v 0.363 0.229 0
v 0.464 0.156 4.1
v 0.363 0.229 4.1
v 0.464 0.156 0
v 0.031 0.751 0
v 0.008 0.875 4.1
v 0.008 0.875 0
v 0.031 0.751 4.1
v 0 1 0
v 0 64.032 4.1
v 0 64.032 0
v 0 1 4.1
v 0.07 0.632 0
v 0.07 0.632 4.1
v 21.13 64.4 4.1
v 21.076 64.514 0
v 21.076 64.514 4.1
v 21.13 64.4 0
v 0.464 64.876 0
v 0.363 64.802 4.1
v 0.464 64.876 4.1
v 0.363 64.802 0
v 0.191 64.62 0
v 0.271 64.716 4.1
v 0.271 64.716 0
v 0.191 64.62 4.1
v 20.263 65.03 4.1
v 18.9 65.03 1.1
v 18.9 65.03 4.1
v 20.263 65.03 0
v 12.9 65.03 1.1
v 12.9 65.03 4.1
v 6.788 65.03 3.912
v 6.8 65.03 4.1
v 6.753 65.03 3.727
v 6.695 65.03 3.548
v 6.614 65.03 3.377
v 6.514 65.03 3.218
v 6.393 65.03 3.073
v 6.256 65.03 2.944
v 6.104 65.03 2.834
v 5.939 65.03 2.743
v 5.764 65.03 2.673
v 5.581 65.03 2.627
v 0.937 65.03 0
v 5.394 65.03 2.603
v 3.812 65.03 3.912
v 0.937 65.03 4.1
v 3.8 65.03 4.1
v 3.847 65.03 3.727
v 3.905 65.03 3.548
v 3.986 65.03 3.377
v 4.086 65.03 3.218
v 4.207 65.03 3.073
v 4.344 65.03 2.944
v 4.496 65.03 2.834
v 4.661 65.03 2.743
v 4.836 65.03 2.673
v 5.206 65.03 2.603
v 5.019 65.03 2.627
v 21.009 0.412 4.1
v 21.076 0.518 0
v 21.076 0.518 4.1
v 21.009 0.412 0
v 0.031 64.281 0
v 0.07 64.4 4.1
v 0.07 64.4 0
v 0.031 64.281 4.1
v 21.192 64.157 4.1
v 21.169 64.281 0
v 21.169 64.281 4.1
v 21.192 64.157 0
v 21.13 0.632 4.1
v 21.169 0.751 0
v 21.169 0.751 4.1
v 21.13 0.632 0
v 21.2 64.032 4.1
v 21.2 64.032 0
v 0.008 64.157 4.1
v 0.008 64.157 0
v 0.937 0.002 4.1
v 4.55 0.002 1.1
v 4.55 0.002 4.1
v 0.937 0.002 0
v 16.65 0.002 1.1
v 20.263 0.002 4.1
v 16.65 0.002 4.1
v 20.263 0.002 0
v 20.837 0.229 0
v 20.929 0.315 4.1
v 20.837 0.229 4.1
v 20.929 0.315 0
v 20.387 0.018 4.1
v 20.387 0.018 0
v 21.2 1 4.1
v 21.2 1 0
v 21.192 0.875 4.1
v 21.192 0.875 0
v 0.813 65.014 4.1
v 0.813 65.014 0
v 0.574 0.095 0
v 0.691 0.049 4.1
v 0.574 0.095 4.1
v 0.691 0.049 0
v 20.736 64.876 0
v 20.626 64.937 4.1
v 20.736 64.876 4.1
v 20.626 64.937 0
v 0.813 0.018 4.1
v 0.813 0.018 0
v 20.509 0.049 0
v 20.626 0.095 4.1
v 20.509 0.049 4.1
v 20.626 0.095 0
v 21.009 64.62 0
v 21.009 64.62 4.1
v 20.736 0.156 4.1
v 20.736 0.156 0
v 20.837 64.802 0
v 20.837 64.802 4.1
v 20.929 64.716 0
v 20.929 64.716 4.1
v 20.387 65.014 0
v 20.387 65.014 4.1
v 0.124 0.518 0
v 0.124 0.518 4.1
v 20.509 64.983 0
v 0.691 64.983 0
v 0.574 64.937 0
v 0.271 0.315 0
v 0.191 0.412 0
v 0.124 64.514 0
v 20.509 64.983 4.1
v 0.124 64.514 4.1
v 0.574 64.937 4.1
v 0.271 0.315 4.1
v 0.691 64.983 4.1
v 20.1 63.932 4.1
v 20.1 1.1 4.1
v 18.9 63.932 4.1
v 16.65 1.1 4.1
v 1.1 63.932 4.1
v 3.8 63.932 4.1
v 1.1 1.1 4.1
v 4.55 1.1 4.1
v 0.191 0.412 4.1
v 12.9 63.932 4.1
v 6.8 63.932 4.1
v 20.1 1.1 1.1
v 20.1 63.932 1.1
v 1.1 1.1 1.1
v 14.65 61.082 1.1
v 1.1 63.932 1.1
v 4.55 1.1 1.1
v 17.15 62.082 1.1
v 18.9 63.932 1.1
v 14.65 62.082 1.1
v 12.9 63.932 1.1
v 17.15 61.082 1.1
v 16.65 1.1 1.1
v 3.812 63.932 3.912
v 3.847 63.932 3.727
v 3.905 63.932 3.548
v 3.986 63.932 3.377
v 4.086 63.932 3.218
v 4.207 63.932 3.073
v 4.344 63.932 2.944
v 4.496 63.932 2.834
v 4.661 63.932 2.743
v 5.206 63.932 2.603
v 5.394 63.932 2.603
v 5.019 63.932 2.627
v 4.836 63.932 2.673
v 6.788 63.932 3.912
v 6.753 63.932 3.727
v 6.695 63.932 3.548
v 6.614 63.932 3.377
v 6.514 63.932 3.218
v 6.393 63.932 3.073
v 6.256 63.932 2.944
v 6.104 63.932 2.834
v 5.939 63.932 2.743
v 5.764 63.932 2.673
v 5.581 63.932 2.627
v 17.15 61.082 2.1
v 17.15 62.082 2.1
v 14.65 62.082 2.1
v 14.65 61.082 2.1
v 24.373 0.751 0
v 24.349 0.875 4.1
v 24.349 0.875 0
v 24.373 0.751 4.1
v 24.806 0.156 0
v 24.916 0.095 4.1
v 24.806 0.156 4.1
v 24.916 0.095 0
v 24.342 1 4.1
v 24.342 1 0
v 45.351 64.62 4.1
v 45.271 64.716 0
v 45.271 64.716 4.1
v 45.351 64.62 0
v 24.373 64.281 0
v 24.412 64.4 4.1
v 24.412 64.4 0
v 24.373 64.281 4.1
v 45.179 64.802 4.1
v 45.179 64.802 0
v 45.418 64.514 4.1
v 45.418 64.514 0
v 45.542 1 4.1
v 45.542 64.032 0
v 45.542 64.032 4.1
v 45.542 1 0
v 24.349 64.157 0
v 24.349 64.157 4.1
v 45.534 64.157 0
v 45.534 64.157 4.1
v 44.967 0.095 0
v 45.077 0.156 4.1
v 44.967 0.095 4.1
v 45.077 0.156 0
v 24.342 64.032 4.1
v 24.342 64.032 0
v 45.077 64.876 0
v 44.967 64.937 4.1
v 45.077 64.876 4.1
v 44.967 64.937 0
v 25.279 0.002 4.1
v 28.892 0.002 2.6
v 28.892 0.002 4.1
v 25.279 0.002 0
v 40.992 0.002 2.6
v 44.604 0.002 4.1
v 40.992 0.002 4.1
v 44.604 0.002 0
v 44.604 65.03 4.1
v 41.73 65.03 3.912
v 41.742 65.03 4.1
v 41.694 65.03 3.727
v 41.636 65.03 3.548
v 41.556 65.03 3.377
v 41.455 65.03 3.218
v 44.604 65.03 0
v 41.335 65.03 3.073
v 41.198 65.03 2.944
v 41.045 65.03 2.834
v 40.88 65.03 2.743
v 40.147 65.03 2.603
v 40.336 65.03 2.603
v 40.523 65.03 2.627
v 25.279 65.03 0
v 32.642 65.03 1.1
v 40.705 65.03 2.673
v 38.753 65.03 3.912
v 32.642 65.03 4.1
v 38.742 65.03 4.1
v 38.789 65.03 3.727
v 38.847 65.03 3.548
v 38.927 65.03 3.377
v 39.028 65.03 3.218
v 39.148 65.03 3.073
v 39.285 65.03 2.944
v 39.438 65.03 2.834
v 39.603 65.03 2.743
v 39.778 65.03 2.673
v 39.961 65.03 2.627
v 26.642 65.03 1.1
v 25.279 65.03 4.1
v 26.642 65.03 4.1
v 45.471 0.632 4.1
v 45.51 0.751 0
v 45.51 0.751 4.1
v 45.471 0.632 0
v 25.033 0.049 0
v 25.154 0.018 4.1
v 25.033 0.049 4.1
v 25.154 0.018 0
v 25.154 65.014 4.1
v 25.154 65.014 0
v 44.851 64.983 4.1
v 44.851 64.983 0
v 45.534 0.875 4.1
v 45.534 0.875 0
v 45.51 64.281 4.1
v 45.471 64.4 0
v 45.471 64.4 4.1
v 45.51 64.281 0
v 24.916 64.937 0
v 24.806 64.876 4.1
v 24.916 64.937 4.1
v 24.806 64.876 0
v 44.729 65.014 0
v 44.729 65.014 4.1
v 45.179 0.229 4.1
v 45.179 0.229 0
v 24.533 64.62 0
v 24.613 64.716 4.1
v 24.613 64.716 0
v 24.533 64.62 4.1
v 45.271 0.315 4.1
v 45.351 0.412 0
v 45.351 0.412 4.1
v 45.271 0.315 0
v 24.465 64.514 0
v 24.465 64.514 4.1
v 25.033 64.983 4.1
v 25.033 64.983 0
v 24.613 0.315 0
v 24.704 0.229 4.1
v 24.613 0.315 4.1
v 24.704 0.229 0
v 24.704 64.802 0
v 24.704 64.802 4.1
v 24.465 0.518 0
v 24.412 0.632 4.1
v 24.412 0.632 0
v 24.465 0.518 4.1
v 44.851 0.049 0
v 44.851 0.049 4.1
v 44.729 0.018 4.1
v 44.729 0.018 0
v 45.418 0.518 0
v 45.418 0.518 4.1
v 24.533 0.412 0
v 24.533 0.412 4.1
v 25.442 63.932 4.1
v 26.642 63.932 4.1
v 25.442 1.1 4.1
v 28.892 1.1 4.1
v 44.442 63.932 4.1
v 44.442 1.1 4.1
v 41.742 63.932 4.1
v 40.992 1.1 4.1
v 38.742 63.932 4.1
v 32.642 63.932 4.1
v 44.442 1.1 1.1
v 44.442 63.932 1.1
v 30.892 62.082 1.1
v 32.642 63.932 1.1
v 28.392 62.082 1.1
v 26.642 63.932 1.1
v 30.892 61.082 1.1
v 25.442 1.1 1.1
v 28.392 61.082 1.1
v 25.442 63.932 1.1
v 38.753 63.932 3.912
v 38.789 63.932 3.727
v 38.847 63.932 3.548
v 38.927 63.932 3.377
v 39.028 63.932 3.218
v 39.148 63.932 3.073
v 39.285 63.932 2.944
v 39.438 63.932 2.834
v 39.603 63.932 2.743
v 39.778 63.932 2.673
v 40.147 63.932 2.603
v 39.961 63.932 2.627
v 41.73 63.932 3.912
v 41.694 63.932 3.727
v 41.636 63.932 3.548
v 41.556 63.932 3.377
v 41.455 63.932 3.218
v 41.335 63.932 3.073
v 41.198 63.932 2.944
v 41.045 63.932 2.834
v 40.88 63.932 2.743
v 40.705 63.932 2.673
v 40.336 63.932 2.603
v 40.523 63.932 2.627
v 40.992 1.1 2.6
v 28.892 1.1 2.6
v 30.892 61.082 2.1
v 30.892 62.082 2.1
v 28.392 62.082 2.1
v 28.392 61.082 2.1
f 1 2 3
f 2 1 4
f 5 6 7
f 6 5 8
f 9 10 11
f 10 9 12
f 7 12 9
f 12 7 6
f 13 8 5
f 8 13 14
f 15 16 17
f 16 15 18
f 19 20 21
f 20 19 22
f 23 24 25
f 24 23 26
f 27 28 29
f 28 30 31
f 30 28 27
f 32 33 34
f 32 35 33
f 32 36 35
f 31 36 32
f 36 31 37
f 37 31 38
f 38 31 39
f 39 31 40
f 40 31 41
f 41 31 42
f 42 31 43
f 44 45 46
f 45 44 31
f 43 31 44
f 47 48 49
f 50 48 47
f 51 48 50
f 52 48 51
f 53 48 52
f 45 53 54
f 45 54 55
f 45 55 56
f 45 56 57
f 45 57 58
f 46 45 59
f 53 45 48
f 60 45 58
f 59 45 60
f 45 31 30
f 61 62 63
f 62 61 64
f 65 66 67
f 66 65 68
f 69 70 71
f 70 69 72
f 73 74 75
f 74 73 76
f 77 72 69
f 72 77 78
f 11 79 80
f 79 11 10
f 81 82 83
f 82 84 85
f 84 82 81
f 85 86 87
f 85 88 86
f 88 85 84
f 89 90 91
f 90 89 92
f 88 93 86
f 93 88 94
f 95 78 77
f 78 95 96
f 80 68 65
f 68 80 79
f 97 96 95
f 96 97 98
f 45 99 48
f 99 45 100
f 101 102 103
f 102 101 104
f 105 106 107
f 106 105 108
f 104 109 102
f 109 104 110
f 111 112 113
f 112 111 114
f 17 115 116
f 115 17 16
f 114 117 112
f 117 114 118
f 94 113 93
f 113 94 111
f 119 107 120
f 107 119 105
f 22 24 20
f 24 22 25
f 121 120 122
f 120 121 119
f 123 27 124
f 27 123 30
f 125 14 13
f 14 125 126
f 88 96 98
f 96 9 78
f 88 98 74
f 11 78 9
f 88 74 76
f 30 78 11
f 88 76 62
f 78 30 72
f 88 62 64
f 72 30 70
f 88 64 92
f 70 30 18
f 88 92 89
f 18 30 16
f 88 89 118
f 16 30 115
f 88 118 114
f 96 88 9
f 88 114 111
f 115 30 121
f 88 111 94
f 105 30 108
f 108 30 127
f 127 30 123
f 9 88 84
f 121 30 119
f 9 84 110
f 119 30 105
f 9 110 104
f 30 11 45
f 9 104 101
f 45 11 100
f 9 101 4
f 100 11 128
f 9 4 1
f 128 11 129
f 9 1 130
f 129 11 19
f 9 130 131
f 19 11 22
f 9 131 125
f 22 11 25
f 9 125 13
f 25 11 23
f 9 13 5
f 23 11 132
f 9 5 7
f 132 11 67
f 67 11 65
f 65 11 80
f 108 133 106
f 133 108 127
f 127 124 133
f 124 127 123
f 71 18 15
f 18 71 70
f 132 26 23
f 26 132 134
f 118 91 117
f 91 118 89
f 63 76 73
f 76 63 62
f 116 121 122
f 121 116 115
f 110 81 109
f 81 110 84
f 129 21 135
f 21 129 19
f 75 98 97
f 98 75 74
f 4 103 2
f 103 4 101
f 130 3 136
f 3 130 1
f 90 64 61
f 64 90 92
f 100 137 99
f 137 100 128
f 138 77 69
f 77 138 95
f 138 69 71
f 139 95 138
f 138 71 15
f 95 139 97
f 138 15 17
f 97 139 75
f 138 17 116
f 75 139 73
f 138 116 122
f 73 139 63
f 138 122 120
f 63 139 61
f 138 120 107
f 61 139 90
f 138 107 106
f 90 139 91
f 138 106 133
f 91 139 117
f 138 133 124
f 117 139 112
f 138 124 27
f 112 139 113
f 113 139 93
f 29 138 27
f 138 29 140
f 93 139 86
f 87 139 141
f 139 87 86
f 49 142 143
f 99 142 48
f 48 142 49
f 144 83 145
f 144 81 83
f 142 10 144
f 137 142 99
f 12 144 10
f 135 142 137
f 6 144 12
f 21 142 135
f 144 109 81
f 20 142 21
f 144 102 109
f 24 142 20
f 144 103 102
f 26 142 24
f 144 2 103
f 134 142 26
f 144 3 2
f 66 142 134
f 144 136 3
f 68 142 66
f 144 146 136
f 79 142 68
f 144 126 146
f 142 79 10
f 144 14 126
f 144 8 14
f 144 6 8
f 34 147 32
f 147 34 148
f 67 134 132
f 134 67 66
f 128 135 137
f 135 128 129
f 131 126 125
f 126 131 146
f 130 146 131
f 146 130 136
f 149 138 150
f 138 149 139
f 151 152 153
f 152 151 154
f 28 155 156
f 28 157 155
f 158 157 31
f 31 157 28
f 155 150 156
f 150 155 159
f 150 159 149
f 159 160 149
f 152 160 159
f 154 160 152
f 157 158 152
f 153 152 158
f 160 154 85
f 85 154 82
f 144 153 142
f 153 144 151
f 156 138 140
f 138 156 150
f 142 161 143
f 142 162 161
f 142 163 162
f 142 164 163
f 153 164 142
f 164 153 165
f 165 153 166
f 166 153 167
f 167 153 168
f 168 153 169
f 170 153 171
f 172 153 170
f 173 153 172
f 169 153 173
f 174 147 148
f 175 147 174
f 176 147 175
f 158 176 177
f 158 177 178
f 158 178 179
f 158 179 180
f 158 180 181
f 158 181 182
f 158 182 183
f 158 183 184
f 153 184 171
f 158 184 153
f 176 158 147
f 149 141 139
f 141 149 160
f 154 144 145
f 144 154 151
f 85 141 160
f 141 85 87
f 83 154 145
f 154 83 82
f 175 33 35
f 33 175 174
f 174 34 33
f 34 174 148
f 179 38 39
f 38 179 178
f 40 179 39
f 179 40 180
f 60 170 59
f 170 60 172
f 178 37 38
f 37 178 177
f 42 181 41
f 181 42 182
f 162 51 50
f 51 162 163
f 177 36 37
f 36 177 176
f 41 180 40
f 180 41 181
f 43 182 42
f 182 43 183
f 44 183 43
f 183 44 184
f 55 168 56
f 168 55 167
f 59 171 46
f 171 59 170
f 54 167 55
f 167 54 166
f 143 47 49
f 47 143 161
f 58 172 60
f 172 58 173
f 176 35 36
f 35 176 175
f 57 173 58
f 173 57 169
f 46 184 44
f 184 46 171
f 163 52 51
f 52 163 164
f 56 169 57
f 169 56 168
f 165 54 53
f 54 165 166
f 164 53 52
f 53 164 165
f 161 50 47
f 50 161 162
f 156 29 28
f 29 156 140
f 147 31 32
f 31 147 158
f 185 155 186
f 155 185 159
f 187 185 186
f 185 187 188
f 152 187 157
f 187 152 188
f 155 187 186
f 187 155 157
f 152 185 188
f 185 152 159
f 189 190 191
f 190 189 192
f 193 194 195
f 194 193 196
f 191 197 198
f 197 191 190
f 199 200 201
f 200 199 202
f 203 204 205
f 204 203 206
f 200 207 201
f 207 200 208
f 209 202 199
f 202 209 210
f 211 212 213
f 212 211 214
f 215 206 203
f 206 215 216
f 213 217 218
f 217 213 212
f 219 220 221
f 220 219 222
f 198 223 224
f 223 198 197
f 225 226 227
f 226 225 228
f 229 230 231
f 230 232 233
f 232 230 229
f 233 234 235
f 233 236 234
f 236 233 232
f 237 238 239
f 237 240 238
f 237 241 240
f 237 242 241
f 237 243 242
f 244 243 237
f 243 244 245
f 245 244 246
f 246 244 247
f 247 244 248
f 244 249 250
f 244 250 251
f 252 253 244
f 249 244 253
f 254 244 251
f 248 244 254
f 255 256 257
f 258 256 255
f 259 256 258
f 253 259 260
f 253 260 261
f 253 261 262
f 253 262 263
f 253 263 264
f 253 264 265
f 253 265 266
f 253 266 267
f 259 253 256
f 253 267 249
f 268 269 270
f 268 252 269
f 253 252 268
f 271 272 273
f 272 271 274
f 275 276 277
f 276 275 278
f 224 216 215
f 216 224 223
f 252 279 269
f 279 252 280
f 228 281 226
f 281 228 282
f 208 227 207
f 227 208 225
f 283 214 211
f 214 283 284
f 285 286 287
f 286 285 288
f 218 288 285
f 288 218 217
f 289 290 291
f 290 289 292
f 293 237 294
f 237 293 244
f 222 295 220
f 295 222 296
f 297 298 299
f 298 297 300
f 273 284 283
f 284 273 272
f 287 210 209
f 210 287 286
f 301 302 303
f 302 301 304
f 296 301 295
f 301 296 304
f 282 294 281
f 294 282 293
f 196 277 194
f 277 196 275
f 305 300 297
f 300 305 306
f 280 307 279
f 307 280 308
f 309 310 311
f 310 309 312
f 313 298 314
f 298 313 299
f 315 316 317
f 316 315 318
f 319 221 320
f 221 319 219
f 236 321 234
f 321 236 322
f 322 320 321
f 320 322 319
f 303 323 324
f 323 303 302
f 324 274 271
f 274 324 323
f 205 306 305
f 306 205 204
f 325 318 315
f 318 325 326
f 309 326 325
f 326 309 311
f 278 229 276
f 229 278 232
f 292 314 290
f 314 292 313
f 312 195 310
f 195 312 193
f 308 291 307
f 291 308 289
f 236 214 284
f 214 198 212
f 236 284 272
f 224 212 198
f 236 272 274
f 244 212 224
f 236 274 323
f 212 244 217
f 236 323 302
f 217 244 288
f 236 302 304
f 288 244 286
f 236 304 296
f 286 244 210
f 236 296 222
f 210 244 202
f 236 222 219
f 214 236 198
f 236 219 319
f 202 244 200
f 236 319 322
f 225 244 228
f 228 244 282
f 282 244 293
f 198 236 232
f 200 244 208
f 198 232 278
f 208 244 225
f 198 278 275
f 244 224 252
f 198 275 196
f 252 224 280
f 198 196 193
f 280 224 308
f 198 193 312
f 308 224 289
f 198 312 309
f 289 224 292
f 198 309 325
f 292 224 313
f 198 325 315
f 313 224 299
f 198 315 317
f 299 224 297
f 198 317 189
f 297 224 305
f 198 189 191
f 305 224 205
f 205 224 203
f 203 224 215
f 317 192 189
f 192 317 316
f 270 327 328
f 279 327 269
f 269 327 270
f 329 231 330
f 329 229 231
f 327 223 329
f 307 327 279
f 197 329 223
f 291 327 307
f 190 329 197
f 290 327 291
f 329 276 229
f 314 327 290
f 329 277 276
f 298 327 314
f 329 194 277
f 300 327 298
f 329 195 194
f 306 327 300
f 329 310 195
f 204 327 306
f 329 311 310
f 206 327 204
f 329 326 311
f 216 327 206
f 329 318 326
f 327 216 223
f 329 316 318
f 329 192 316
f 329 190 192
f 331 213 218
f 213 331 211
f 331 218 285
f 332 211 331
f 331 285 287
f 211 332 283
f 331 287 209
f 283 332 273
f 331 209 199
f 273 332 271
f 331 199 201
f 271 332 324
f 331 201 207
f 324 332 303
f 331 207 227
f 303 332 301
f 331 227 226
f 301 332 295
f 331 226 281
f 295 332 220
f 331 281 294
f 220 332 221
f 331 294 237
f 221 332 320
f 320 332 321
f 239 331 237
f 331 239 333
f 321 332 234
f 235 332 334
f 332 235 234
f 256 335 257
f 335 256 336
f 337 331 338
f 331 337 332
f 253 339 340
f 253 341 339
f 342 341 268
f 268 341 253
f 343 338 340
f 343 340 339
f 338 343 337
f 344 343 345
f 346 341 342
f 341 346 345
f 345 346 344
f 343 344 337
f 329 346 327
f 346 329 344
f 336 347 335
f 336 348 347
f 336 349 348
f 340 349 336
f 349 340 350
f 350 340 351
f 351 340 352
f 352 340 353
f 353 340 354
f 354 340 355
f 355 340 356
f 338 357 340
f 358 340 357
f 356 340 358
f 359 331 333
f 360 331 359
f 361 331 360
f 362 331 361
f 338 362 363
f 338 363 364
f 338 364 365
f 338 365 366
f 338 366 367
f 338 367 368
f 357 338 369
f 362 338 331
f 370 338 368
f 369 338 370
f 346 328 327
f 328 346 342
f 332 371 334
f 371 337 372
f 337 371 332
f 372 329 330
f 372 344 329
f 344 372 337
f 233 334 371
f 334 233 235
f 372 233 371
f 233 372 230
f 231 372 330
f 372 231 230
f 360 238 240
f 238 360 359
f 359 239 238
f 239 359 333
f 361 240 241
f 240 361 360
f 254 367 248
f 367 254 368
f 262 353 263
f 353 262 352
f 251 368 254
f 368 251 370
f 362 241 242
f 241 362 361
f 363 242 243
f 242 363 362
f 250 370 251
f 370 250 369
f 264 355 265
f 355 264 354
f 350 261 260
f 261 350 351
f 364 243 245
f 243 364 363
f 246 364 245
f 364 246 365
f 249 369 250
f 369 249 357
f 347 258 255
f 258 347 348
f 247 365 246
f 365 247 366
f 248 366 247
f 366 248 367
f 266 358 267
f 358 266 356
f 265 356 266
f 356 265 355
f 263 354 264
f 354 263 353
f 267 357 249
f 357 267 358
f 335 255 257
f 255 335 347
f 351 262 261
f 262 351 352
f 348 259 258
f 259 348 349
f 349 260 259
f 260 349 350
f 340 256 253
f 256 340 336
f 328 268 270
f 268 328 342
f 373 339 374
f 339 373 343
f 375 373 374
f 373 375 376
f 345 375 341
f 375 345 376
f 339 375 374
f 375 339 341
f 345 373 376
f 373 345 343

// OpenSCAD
//Metric units
//Definitions
pi = 3.1415927;
safe_distance = 0.05;
interior_width = 19;
interior_depth = 20*pi; //Why? because I can.
interior_height = 6;
wall_thickness = 1.1;
usb_width = 12.1;
usb_height = 4.5;
usb_depth = 5;//As place_holder, should be > wall_thickness
push_width = 6;
push_height = 6;
push_depth = 3;
led_diameter = 3;
led_height = 3;//As placeholder, should be > wall_thickness
push_holder_w = 2.5;
push_holder_h = 1;
push_holder_d = 1;

base_wall_height = interior_height/2;
exterior_width = interior_width + wall_thickness*2;
exterior_depth = interior_depth + wall_thickness*2;
exterior_height = interior_height + wall_thickness*2;

base_height = wall_thickness + base_wall_height;
base_width = exterior_width;
base_depth = exterior_depth;

led_x_center = (exterior_width/4);
led_y_center = base_depth-wall_thickness-safe_distance;
led_z_center = exterior_height/2;

push_x_pos = exterior_width/2 + (exterior_width/2-push_width)/2;
push_y_pos = base_depth-push_depth+safe_distance;
push_z_pos = (exterior_height-push_height)/2;

//http://www.thingiverse.com/thing:9347 fixed for dimensional precision
module roundedRect(size, radius)
{
	x = size[0];
	y = size[1];
	z = size[2];
	linear_extrude(height=z)
	hull()
	{
		// place 4 circles in the corners, with the given radius
		translate([(radius), (radius), 0])
		circle(r=radius);
	
		translate([(x)-(radius), (radius), 0])
		circle(r=radius);
	
		translate([(radius), (y)-(radius), 0])
		circle(r=radius);
	
		translate([(x)-(radius), (y)-(radius), 0])
		circle(r=radius);
	}
}

module usb_plug_placeholder()
{
    cube([usb_width, usb_depth, usb_height], center = false);
}

module led_placeholder()
{
    rotate([-90,0,0])
        cylinder(led_height, d=led_diameter, center=true,$fn=50);
}

module push_place_holder()
{
    cube([push_width, push_depth, push_height]);
}


module base()
{
    difference()
    {
        roundedRect([base_width, base_depth, base_height], 1,$fn=50);
        translate([wall_thickness,wall_thickness,wall_thickness])
            cube([interior_width,interior_depth,interior_height],center = false);
        translate([(base_width-usb_width)/2,-safe_distance,wall_thickness])
            usb_plug_placeholder();
        

        translate([led_x_center, led_y_center, led_z_center])
            led_placeholder();
        
        translate([push_x_pos, push_y_pos, push_z_pos])
            push_place_holder();     
    };
    translate([push_x_pos + (push_width-push_holder_w)/2,push_y_pos-push_holder_d,push_z_pos])
        cube([push_holder_w,push_holder_d,push_holder_h]);
}

module capote()
{
    difference()
    {
        roundedRect([base_width, base_depth, base_height], 1,$fn=50);
        translate([wall_thickness,wall_thickness,wall_thickness])
            cube([interior_width,interior_depth,interior_height],center = false);
        translate([(base_width-usb_width)/2,-safe_distance,interior_height-usb_height+wall_thickness])
            usb_plug_placeholder();

        translate([base_width-led_x_center, led_y_center, led_z_center])
            led_placeholder();
        
        translate([base_width-push_width-push_x_pos, push_y_pos, push_z_pos])
            push_place_holder();     
    };
    translate([((base_width-push_width-push_x_pos)+ (push_width-push_holder_w)/2),push_y_pos-push_holder_d,push_z_pos])
        cube([push_holder_w,push_holder_d,push_holder_h]);
}

base();

translate([base_width+pi,0,0])
    capote();
